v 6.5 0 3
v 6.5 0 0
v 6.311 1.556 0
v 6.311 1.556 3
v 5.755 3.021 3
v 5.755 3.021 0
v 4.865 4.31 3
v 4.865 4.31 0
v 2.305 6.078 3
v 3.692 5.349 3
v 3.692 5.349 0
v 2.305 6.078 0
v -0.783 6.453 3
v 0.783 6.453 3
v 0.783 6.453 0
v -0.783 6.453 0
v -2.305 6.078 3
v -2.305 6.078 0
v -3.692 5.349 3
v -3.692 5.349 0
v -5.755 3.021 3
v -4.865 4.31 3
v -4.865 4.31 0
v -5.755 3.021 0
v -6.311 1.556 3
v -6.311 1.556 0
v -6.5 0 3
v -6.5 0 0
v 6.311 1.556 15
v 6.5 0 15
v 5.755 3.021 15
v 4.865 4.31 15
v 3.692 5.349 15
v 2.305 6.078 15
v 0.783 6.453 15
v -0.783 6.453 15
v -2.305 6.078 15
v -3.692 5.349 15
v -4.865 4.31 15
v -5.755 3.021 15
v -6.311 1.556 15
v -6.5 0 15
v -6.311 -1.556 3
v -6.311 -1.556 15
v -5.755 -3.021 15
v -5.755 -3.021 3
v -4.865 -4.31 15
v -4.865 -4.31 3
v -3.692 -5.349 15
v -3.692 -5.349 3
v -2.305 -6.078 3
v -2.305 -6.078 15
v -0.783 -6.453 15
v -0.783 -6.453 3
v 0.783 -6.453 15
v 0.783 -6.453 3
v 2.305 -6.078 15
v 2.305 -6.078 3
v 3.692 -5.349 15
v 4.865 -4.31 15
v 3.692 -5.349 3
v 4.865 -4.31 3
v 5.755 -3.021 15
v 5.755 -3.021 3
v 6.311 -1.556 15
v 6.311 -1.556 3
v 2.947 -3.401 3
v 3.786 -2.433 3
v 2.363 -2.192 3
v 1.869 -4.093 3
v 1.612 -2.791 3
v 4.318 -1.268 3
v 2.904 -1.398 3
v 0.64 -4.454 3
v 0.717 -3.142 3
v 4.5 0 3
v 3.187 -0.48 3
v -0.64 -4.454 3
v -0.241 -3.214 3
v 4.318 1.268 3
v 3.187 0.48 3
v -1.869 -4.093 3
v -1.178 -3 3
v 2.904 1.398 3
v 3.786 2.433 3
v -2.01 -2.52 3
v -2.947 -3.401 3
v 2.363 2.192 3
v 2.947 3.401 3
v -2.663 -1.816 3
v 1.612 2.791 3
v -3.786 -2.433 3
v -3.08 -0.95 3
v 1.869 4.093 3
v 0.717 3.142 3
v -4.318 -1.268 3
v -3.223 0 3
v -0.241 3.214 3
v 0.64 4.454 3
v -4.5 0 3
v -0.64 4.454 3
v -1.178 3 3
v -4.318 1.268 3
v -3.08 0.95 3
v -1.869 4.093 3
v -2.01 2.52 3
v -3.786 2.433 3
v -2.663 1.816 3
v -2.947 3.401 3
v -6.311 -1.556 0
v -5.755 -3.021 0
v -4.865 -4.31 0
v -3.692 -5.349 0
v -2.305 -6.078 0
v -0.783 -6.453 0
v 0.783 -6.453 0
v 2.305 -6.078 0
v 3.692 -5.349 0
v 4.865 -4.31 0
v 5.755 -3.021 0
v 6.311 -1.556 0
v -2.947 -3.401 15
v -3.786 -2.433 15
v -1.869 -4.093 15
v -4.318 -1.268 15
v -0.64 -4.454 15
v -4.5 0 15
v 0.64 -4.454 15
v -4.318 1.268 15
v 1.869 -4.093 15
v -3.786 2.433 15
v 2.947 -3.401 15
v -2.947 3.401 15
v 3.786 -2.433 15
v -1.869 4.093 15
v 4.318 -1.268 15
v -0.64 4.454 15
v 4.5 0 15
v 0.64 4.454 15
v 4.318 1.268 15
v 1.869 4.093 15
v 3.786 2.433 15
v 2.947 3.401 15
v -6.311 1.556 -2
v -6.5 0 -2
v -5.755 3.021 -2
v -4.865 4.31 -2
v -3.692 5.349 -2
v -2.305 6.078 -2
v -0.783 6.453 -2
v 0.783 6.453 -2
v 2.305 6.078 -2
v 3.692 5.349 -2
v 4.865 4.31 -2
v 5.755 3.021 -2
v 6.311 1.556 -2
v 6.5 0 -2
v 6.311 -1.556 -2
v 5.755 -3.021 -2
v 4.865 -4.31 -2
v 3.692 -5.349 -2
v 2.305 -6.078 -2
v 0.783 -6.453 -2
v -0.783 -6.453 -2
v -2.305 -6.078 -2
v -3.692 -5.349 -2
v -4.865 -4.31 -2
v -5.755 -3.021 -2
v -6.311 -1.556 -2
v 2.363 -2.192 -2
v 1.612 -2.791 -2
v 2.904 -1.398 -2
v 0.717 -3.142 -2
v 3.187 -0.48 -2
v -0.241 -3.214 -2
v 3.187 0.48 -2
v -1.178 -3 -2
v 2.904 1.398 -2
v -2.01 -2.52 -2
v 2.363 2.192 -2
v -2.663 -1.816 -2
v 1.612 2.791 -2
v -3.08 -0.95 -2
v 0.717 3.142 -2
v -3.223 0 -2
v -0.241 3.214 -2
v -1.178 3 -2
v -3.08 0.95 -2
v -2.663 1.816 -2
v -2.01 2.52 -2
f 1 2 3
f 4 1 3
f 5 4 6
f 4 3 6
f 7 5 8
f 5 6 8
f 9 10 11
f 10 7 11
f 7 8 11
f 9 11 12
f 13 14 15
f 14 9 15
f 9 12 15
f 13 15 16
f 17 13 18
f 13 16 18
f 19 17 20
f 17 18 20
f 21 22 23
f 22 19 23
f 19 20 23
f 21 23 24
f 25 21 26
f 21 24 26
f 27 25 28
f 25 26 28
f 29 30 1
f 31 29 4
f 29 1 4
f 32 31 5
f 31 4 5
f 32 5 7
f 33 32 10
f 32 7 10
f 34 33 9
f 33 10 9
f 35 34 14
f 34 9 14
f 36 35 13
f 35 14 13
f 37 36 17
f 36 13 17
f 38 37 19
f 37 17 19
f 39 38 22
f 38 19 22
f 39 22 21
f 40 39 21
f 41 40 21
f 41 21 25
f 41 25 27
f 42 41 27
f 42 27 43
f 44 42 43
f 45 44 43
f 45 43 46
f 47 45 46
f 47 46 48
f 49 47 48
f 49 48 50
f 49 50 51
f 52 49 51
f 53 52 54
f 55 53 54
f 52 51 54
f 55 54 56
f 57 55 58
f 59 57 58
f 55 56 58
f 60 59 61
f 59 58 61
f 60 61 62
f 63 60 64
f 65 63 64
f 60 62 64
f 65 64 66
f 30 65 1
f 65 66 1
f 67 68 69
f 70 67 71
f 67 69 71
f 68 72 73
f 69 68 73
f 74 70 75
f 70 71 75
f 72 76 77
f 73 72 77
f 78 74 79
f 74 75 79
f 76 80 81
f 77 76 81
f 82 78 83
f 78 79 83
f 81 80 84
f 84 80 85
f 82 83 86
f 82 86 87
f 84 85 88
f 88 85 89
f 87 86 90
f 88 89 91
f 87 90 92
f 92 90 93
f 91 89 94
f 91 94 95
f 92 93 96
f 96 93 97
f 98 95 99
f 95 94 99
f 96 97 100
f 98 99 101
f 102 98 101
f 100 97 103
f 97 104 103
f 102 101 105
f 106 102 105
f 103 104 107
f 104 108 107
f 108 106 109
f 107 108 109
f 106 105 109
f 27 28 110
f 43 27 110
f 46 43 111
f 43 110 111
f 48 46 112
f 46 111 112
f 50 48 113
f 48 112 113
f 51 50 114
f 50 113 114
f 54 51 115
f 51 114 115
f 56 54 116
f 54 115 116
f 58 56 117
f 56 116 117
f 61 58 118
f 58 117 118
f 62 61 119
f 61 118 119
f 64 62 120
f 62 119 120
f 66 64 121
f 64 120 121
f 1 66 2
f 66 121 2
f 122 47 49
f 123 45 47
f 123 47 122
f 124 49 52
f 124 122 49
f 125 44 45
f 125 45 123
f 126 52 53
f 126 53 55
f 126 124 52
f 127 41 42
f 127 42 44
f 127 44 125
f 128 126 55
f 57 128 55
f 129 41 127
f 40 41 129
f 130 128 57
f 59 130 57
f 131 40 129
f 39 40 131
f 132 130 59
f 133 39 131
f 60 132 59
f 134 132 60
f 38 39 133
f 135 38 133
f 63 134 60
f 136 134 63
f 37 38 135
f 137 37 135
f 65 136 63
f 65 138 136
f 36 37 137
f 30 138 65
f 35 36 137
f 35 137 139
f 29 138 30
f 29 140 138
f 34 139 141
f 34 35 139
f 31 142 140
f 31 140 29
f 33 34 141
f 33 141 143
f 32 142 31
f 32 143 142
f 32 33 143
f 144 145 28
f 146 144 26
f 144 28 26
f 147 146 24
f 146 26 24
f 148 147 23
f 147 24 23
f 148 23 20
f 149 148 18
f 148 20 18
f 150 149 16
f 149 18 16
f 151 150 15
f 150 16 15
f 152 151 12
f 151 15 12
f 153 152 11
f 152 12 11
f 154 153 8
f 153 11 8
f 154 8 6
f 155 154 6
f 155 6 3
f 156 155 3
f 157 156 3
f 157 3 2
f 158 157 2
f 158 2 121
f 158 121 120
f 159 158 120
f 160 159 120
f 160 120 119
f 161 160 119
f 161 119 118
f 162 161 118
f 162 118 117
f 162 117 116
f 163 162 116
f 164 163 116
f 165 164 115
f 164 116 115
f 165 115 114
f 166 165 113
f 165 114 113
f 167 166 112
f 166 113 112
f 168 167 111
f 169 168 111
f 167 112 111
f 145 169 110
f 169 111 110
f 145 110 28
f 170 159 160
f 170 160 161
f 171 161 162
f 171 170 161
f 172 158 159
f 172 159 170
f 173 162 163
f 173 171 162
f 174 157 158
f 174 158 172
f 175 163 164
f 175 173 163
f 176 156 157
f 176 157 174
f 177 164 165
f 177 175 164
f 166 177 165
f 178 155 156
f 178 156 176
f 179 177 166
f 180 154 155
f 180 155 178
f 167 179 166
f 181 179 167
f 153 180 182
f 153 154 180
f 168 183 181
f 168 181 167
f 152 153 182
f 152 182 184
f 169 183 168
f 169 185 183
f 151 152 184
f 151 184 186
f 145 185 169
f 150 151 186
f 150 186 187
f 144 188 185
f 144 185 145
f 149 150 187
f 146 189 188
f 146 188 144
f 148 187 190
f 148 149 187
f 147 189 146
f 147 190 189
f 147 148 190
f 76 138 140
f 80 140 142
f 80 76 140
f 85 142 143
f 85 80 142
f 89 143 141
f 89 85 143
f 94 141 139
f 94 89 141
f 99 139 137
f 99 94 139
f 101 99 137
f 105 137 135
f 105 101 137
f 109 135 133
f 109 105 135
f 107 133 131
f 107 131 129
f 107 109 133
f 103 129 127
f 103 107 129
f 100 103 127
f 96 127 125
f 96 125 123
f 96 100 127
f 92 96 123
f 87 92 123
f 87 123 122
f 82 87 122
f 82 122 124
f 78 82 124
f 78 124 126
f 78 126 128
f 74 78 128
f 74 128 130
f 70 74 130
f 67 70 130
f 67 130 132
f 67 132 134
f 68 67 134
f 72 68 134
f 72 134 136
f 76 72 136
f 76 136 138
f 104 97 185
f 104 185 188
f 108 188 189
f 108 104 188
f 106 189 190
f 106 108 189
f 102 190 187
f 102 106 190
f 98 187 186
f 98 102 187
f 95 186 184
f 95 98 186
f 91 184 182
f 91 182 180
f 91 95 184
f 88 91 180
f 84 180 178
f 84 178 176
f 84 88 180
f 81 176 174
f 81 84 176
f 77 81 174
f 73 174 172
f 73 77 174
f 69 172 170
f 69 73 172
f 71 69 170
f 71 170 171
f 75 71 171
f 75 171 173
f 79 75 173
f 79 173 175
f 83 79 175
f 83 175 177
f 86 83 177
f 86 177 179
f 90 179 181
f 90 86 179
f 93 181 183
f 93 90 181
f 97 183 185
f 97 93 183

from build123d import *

# Parameters (mm, degrees)
SKETCH1_R                = 6.5
SKETCH1_R_2              = 4.5
BOSS_EXTRUDE1_DEPTH      = 15
BOSS_EXTRUDE2_DEPTH      = 2
BOSS_EXTRUDE2_DEPTH_BACK = 3
SKETCH2_R                = 6.5
SKETCH2_R_2              = 3.223163269


with BuildPart() as part:
    # Sketch1 → Boss-Extrude1 (new body)
    with BuildSketch(Plane.XY):
        Circle(SKETCH1_R)
        Circle(SKETCH1_R_2, mode=Mode.SUBTRACT)
    extrude(amount=BOSS_EXTRUDE1_DEPTH)

    # Sketch2 → Boss-Extrude2 (add, two sides: drawn at the far end of the back side and taken through both)
    with BuildSketch(Plane(origin=(0, 0, 0), x_dir=(-1, 0, 0), z_dir=(0, 0, -1)).offset(-BOSS_EXTRUDE2_DEPTH_BACK)):
        Circle(SKETCH2_R)
        Circle(SKETCH2_R_2, mode=Mode.SUBTRACT)
    extrude(amount=BOSS_EXTRUDE2_DEPTH + BOSS_EXTRUDE2_DEPTH_BACK)


solid = part.part
